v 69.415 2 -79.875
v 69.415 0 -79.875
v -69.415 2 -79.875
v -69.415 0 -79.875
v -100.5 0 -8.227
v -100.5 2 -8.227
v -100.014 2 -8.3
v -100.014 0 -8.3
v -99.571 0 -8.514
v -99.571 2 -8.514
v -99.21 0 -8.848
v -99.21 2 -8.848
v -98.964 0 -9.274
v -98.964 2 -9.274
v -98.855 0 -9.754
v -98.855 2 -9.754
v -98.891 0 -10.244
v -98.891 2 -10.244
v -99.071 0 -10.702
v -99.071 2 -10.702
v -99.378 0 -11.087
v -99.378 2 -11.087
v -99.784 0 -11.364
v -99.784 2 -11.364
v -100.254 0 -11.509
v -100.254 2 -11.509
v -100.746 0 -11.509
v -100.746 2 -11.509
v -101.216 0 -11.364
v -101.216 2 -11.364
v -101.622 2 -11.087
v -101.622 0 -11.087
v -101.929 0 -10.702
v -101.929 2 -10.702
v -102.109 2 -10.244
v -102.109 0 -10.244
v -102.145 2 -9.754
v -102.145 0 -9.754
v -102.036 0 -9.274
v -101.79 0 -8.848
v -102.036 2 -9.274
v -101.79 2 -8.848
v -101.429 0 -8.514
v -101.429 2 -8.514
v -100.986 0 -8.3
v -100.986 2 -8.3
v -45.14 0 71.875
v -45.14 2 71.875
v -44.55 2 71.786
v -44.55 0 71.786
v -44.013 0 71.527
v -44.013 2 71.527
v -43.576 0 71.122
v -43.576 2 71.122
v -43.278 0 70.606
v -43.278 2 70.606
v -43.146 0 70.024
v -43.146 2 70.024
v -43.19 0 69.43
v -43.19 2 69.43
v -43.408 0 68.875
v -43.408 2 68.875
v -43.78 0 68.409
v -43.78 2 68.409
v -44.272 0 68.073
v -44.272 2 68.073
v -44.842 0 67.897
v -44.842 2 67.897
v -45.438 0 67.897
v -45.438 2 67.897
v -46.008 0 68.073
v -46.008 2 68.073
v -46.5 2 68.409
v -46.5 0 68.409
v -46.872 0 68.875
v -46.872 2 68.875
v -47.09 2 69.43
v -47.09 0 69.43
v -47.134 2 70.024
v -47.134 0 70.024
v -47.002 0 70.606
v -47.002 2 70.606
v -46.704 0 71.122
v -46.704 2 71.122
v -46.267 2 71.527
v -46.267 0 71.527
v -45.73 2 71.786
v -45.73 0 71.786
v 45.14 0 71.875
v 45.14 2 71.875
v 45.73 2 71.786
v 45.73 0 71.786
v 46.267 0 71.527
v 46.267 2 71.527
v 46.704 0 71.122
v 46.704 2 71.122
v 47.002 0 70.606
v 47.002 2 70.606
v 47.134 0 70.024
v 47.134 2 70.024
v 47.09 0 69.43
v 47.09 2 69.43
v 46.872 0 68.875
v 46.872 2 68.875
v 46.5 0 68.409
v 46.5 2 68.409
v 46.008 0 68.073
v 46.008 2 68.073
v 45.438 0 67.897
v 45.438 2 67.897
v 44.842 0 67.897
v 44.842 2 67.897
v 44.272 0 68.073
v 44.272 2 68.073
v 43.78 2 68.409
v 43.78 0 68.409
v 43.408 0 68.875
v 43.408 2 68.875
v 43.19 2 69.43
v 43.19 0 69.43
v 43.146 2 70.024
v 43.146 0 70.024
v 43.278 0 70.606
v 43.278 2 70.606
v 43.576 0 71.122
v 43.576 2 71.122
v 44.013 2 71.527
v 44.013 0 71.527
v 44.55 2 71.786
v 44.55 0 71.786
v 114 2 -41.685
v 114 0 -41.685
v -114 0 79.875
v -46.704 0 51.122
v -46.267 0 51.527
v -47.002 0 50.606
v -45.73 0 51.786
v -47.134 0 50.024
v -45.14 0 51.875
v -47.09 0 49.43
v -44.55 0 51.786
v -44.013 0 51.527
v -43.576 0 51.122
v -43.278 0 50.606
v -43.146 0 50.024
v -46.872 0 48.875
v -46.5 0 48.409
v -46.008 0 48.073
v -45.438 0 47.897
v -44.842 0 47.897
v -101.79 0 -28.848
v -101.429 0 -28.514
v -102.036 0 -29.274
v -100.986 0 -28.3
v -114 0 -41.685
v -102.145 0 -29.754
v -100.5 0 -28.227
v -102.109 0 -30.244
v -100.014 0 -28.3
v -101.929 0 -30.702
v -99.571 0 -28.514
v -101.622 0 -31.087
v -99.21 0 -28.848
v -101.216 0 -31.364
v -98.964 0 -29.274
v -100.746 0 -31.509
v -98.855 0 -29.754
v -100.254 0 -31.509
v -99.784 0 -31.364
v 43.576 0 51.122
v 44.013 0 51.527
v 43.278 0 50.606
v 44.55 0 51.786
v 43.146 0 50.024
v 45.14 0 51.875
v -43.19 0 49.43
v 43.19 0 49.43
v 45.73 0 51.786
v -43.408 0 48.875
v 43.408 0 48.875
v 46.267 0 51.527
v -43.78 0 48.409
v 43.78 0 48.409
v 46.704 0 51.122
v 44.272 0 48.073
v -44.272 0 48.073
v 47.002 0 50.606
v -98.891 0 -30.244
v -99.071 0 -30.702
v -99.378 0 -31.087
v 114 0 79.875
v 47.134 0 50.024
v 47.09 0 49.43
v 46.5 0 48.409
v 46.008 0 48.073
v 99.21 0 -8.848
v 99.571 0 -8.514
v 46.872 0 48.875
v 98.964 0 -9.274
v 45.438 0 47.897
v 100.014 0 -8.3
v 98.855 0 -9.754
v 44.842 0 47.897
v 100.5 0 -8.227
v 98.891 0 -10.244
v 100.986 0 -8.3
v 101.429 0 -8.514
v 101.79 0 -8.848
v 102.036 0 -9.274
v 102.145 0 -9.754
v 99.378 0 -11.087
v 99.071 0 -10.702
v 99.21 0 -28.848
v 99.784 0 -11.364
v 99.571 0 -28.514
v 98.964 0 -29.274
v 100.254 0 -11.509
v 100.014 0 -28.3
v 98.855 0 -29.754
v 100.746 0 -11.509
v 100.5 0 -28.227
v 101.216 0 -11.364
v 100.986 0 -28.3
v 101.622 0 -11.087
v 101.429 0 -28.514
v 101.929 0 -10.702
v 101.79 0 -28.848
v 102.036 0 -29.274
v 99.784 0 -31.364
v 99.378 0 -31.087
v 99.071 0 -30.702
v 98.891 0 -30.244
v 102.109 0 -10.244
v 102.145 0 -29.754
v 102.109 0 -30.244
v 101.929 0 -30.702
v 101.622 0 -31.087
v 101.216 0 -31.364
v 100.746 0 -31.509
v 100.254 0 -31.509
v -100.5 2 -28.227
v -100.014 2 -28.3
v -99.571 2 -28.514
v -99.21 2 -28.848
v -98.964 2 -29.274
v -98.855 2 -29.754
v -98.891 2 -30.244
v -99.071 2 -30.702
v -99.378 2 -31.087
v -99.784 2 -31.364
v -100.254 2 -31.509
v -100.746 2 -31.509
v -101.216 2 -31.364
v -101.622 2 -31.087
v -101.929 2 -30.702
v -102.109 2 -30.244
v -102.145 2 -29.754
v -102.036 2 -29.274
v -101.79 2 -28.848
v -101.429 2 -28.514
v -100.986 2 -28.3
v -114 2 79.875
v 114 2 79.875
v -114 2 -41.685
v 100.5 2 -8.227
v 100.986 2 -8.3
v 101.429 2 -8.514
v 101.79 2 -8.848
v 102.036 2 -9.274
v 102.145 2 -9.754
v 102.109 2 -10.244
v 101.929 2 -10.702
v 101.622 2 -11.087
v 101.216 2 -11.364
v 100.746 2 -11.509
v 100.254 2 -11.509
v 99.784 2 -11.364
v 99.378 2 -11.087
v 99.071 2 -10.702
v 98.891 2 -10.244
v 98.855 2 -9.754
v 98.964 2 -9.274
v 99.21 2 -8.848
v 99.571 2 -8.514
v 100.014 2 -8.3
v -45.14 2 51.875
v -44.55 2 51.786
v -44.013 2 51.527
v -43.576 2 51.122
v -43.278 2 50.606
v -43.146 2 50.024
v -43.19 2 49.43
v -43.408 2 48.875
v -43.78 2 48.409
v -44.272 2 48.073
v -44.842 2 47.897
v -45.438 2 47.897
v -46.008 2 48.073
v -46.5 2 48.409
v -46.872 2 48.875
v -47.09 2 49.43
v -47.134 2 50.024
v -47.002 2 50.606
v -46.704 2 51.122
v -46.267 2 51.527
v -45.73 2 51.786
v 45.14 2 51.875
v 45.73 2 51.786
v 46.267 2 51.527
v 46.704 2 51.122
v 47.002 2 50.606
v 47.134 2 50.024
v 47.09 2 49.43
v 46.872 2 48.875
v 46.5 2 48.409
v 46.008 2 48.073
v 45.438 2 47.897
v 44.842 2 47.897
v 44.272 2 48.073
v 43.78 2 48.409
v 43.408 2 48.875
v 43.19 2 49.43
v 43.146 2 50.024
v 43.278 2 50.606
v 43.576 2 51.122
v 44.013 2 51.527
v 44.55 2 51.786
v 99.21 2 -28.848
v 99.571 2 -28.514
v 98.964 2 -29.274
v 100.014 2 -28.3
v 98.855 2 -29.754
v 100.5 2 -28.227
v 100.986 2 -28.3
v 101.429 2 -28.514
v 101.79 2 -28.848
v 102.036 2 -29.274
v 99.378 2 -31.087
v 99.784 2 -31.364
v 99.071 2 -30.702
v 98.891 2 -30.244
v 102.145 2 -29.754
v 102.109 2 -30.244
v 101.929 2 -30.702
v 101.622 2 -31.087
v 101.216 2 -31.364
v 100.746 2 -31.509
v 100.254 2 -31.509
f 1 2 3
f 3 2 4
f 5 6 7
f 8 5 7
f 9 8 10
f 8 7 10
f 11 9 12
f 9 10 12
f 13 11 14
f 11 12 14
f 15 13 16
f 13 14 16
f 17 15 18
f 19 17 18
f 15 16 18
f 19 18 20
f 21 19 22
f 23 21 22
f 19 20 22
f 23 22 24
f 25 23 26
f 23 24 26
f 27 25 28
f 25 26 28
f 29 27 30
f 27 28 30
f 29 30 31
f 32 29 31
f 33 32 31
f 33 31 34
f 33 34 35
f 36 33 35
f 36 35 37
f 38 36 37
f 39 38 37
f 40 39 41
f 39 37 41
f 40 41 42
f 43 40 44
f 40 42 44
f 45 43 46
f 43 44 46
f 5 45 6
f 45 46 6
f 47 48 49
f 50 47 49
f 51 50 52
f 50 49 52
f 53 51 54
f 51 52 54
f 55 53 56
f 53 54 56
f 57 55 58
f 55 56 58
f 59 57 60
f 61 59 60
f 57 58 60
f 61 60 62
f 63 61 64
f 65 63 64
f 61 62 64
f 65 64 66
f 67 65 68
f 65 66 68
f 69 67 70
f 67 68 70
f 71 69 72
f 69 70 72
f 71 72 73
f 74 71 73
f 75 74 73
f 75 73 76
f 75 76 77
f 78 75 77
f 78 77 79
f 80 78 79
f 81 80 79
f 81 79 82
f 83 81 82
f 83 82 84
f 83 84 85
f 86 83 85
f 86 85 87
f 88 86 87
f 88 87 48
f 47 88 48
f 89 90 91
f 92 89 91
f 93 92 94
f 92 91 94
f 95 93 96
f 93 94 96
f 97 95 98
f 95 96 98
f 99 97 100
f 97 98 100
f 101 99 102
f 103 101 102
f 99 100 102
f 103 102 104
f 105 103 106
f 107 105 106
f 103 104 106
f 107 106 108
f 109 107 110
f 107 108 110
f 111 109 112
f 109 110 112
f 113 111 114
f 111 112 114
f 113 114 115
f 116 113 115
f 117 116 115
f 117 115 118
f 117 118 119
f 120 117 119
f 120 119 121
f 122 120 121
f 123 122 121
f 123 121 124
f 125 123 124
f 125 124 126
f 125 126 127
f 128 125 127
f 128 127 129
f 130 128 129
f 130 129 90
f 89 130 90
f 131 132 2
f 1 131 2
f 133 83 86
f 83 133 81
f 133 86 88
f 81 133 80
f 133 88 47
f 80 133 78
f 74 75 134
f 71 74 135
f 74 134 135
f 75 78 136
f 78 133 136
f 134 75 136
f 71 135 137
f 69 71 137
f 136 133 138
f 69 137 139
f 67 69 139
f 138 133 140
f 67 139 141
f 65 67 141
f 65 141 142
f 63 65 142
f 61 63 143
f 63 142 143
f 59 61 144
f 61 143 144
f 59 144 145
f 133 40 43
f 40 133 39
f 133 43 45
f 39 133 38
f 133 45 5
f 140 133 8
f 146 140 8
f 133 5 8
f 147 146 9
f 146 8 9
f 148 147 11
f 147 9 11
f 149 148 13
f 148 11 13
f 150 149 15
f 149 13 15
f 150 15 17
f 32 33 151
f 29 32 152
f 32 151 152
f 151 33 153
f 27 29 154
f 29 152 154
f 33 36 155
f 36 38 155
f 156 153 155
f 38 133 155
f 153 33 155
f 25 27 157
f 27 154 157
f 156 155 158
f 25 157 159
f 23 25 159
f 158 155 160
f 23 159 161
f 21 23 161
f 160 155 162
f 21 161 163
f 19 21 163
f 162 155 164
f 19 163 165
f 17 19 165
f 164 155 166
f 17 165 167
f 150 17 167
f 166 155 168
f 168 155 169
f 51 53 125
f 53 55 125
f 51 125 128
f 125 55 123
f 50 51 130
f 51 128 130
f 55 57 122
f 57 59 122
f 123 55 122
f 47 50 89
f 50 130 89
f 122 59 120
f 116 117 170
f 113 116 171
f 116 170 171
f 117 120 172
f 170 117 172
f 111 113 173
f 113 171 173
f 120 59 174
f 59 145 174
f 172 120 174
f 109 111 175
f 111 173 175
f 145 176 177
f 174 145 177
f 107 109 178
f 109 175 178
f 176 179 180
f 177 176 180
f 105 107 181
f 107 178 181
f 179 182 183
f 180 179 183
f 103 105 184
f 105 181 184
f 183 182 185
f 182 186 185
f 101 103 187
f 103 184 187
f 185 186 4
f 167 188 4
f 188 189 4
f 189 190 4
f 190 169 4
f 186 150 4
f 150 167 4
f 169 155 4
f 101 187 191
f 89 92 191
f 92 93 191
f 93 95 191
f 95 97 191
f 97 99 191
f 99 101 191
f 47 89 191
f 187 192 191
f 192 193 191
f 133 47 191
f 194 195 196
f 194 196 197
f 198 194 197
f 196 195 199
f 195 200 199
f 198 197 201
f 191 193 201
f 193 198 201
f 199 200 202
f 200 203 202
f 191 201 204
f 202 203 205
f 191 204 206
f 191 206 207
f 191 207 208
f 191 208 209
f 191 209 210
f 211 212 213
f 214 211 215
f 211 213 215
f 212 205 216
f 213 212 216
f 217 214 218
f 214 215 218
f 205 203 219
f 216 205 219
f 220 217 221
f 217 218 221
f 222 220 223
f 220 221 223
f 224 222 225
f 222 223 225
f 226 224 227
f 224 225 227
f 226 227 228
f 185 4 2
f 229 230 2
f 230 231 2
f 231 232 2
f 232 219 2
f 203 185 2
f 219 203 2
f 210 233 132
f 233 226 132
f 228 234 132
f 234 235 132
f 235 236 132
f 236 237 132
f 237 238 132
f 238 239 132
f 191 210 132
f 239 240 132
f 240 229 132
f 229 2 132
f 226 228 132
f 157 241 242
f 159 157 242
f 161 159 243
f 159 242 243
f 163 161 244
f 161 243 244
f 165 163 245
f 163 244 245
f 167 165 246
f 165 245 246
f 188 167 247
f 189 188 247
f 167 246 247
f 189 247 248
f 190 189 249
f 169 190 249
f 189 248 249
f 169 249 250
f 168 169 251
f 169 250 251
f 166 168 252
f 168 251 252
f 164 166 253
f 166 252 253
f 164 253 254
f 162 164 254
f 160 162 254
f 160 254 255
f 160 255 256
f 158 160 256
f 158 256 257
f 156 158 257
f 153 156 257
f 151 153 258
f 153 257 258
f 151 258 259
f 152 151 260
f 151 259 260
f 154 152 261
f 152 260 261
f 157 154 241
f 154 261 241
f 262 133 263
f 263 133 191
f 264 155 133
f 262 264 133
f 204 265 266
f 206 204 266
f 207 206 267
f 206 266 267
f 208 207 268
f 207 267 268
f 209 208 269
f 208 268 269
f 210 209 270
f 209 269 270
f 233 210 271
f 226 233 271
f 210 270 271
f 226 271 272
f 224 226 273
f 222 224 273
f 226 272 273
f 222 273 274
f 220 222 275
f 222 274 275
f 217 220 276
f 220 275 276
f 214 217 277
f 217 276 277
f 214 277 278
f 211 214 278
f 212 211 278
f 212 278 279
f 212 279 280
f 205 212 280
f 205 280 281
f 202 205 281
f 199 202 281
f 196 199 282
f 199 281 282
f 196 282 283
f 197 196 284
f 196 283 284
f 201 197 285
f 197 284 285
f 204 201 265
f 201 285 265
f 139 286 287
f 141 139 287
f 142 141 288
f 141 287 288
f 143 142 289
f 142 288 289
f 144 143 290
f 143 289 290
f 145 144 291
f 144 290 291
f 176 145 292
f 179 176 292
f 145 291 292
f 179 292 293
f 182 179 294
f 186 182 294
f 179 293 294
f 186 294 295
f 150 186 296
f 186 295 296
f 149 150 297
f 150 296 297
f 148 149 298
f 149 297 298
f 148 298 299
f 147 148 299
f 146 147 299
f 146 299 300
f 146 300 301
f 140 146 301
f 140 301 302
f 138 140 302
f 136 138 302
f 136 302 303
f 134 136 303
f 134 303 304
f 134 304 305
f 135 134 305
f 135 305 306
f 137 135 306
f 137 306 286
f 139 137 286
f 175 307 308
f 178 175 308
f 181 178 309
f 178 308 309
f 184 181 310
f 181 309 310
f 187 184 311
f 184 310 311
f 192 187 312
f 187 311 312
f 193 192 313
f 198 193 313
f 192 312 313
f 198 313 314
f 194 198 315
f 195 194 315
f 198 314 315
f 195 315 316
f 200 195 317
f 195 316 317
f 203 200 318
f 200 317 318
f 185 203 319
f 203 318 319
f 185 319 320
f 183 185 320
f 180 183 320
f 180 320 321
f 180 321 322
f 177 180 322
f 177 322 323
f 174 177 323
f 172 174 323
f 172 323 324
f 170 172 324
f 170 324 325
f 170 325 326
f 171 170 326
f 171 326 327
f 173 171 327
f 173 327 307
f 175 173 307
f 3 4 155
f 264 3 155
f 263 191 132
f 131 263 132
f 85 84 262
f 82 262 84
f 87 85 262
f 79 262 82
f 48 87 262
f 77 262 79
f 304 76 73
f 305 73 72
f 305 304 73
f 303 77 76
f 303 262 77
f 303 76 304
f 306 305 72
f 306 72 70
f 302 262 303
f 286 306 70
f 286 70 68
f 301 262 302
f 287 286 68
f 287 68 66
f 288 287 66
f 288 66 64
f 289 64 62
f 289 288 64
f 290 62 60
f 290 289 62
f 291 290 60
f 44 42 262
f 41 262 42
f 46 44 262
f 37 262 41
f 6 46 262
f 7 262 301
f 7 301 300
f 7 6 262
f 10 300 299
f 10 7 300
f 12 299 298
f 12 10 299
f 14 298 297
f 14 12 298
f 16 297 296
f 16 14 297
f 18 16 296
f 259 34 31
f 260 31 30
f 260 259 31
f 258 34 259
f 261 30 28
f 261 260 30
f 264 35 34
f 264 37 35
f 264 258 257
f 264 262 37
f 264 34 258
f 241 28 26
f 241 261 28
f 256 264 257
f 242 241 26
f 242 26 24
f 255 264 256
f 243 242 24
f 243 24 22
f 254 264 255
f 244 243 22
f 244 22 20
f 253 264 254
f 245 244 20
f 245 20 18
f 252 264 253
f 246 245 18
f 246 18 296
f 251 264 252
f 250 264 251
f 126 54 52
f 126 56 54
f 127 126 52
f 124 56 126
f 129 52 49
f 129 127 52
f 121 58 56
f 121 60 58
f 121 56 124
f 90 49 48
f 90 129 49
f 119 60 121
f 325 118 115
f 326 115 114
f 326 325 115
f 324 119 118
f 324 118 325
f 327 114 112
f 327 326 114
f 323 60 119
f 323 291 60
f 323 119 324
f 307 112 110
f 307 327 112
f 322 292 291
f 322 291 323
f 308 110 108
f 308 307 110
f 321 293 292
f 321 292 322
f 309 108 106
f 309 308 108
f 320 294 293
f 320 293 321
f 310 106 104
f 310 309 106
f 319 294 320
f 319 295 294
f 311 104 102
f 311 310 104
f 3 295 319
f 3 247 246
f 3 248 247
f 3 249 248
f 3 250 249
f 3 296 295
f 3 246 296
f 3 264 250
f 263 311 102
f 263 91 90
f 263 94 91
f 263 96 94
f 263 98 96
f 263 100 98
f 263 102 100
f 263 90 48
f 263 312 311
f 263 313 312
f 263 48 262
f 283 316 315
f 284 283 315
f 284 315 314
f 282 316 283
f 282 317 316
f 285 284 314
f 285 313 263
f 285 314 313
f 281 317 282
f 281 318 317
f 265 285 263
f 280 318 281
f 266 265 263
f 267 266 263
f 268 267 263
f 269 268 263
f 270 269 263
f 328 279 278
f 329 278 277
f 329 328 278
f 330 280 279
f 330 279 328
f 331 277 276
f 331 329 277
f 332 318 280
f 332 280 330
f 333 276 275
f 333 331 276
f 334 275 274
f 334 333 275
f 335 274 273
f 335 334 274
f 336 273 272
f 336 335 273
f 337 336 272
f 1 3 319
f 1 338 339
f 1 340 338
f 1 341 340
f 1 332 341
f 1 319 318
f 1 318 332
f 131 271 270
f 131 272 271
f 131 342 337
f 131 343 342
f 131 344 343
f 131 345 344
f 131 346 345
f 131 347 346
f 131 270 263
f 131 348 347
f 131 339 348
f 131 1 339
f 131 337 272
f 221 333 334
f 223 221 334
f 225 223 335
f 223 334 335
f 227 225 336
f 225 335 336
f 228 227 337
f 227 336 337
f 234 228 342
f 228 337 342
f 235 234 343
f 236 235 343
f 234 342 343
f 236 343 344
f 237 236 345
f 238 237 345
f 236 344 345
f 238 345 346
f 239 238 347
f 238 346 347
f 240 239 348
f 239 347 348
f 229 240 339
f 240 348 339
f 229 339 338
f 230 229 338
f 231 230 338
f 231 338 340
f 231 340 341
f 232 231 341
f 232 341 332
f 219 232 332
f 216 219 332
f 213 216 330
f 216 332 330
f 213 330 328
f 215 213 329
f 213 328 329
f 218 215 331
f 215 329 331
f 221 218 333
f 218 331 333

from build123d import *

# Parameters (mm, degrees)
RESSALTO_EXTRUS_O1_DEPTH = 2
ESBO_O3_R                = 2
CORTE_EXTRUS_O2_DEPTH    = 10
ESBO_O5_R                = 1.65
CORTE_EXTRUS_O5_DEPTH    = 2


with BuildPart() as part:
    # Esboço1 → Ressalto-extrusão1 (new body)
    with BuildSketch(Plane(origin=(0, 0, 0), x_dir=(1, 0, 0), z_dir=(0, 1, 0))):
        Polygon((-114, 41.685), (-114, -79.875), (-51, -79.875), (0, -79.875), (0, 79.875), (-69.415, 79.875), align=None)
        Polygon((0, 79.875), (0, -79.875), (51.996049983, -79.875), (114, -79.875), (114, 41.685), (69.415, 79.875), align=None)
    extrude(amount=RESSALTO_EXTRUS_O1_DEPTH)

    # Esboço3 → Corte-extrusão2 (cut)
    with BuildSketch(Plane(origin=(0, 2, 0), x_dir=(1, 0, 0), z_dir=(0, 1, 0))):
        with Locations(Location((-45.14, -69.875, 0), (0, 0, 270))):
            Circle(ESBO_O3_R)
        with Locations(Location((45.14, -69.875, 0), (0, 0, 270))):
            Circle(ESBO_O3_R)
        with Locations(Location((-45.14, -49.875, 0), (0, 0, 270))):
            Circle(ESBO_O3_R)
        with Locations(Location((45.14, -49.875, 0), (0, 0, 270))):
            Circle(ESBO_O3_R)
    extrude(amount=-CORTE_EXTRUS_O2_DEPTH, mode=Mode.SUBTRACT)

    # Esboço5 → Corte-extrusão5 (cut)
    with BuildSketch(Plane(origin=(0, 2, 0), x_dir=(1, 0, 0), z_dir=(0, 1, 0))):
        with Locations(Location((100.5, 29.876998266, 0), (0, 0, 270))):
            Circle(ESBO_O5_R)
        with Locations(Location((100.5, 9.876998266, 0), (0, 0, 270))):
            Circle(ESBO_O5_R)
        with Locations(Location((-100.5, 29.876998266, 0), (0, 0, 270))):
            Circle(ESBO_O5_R)
        with Locations(Location((-100.5, 9.876998266, 0), (0, 0, 270))):
            Circle(ESBO_O5_R)
    extrude(amount=-CORTE_EXTRUS_O5_DEPTH, mode=Mode.SUBTRACT)


solid = part.part
